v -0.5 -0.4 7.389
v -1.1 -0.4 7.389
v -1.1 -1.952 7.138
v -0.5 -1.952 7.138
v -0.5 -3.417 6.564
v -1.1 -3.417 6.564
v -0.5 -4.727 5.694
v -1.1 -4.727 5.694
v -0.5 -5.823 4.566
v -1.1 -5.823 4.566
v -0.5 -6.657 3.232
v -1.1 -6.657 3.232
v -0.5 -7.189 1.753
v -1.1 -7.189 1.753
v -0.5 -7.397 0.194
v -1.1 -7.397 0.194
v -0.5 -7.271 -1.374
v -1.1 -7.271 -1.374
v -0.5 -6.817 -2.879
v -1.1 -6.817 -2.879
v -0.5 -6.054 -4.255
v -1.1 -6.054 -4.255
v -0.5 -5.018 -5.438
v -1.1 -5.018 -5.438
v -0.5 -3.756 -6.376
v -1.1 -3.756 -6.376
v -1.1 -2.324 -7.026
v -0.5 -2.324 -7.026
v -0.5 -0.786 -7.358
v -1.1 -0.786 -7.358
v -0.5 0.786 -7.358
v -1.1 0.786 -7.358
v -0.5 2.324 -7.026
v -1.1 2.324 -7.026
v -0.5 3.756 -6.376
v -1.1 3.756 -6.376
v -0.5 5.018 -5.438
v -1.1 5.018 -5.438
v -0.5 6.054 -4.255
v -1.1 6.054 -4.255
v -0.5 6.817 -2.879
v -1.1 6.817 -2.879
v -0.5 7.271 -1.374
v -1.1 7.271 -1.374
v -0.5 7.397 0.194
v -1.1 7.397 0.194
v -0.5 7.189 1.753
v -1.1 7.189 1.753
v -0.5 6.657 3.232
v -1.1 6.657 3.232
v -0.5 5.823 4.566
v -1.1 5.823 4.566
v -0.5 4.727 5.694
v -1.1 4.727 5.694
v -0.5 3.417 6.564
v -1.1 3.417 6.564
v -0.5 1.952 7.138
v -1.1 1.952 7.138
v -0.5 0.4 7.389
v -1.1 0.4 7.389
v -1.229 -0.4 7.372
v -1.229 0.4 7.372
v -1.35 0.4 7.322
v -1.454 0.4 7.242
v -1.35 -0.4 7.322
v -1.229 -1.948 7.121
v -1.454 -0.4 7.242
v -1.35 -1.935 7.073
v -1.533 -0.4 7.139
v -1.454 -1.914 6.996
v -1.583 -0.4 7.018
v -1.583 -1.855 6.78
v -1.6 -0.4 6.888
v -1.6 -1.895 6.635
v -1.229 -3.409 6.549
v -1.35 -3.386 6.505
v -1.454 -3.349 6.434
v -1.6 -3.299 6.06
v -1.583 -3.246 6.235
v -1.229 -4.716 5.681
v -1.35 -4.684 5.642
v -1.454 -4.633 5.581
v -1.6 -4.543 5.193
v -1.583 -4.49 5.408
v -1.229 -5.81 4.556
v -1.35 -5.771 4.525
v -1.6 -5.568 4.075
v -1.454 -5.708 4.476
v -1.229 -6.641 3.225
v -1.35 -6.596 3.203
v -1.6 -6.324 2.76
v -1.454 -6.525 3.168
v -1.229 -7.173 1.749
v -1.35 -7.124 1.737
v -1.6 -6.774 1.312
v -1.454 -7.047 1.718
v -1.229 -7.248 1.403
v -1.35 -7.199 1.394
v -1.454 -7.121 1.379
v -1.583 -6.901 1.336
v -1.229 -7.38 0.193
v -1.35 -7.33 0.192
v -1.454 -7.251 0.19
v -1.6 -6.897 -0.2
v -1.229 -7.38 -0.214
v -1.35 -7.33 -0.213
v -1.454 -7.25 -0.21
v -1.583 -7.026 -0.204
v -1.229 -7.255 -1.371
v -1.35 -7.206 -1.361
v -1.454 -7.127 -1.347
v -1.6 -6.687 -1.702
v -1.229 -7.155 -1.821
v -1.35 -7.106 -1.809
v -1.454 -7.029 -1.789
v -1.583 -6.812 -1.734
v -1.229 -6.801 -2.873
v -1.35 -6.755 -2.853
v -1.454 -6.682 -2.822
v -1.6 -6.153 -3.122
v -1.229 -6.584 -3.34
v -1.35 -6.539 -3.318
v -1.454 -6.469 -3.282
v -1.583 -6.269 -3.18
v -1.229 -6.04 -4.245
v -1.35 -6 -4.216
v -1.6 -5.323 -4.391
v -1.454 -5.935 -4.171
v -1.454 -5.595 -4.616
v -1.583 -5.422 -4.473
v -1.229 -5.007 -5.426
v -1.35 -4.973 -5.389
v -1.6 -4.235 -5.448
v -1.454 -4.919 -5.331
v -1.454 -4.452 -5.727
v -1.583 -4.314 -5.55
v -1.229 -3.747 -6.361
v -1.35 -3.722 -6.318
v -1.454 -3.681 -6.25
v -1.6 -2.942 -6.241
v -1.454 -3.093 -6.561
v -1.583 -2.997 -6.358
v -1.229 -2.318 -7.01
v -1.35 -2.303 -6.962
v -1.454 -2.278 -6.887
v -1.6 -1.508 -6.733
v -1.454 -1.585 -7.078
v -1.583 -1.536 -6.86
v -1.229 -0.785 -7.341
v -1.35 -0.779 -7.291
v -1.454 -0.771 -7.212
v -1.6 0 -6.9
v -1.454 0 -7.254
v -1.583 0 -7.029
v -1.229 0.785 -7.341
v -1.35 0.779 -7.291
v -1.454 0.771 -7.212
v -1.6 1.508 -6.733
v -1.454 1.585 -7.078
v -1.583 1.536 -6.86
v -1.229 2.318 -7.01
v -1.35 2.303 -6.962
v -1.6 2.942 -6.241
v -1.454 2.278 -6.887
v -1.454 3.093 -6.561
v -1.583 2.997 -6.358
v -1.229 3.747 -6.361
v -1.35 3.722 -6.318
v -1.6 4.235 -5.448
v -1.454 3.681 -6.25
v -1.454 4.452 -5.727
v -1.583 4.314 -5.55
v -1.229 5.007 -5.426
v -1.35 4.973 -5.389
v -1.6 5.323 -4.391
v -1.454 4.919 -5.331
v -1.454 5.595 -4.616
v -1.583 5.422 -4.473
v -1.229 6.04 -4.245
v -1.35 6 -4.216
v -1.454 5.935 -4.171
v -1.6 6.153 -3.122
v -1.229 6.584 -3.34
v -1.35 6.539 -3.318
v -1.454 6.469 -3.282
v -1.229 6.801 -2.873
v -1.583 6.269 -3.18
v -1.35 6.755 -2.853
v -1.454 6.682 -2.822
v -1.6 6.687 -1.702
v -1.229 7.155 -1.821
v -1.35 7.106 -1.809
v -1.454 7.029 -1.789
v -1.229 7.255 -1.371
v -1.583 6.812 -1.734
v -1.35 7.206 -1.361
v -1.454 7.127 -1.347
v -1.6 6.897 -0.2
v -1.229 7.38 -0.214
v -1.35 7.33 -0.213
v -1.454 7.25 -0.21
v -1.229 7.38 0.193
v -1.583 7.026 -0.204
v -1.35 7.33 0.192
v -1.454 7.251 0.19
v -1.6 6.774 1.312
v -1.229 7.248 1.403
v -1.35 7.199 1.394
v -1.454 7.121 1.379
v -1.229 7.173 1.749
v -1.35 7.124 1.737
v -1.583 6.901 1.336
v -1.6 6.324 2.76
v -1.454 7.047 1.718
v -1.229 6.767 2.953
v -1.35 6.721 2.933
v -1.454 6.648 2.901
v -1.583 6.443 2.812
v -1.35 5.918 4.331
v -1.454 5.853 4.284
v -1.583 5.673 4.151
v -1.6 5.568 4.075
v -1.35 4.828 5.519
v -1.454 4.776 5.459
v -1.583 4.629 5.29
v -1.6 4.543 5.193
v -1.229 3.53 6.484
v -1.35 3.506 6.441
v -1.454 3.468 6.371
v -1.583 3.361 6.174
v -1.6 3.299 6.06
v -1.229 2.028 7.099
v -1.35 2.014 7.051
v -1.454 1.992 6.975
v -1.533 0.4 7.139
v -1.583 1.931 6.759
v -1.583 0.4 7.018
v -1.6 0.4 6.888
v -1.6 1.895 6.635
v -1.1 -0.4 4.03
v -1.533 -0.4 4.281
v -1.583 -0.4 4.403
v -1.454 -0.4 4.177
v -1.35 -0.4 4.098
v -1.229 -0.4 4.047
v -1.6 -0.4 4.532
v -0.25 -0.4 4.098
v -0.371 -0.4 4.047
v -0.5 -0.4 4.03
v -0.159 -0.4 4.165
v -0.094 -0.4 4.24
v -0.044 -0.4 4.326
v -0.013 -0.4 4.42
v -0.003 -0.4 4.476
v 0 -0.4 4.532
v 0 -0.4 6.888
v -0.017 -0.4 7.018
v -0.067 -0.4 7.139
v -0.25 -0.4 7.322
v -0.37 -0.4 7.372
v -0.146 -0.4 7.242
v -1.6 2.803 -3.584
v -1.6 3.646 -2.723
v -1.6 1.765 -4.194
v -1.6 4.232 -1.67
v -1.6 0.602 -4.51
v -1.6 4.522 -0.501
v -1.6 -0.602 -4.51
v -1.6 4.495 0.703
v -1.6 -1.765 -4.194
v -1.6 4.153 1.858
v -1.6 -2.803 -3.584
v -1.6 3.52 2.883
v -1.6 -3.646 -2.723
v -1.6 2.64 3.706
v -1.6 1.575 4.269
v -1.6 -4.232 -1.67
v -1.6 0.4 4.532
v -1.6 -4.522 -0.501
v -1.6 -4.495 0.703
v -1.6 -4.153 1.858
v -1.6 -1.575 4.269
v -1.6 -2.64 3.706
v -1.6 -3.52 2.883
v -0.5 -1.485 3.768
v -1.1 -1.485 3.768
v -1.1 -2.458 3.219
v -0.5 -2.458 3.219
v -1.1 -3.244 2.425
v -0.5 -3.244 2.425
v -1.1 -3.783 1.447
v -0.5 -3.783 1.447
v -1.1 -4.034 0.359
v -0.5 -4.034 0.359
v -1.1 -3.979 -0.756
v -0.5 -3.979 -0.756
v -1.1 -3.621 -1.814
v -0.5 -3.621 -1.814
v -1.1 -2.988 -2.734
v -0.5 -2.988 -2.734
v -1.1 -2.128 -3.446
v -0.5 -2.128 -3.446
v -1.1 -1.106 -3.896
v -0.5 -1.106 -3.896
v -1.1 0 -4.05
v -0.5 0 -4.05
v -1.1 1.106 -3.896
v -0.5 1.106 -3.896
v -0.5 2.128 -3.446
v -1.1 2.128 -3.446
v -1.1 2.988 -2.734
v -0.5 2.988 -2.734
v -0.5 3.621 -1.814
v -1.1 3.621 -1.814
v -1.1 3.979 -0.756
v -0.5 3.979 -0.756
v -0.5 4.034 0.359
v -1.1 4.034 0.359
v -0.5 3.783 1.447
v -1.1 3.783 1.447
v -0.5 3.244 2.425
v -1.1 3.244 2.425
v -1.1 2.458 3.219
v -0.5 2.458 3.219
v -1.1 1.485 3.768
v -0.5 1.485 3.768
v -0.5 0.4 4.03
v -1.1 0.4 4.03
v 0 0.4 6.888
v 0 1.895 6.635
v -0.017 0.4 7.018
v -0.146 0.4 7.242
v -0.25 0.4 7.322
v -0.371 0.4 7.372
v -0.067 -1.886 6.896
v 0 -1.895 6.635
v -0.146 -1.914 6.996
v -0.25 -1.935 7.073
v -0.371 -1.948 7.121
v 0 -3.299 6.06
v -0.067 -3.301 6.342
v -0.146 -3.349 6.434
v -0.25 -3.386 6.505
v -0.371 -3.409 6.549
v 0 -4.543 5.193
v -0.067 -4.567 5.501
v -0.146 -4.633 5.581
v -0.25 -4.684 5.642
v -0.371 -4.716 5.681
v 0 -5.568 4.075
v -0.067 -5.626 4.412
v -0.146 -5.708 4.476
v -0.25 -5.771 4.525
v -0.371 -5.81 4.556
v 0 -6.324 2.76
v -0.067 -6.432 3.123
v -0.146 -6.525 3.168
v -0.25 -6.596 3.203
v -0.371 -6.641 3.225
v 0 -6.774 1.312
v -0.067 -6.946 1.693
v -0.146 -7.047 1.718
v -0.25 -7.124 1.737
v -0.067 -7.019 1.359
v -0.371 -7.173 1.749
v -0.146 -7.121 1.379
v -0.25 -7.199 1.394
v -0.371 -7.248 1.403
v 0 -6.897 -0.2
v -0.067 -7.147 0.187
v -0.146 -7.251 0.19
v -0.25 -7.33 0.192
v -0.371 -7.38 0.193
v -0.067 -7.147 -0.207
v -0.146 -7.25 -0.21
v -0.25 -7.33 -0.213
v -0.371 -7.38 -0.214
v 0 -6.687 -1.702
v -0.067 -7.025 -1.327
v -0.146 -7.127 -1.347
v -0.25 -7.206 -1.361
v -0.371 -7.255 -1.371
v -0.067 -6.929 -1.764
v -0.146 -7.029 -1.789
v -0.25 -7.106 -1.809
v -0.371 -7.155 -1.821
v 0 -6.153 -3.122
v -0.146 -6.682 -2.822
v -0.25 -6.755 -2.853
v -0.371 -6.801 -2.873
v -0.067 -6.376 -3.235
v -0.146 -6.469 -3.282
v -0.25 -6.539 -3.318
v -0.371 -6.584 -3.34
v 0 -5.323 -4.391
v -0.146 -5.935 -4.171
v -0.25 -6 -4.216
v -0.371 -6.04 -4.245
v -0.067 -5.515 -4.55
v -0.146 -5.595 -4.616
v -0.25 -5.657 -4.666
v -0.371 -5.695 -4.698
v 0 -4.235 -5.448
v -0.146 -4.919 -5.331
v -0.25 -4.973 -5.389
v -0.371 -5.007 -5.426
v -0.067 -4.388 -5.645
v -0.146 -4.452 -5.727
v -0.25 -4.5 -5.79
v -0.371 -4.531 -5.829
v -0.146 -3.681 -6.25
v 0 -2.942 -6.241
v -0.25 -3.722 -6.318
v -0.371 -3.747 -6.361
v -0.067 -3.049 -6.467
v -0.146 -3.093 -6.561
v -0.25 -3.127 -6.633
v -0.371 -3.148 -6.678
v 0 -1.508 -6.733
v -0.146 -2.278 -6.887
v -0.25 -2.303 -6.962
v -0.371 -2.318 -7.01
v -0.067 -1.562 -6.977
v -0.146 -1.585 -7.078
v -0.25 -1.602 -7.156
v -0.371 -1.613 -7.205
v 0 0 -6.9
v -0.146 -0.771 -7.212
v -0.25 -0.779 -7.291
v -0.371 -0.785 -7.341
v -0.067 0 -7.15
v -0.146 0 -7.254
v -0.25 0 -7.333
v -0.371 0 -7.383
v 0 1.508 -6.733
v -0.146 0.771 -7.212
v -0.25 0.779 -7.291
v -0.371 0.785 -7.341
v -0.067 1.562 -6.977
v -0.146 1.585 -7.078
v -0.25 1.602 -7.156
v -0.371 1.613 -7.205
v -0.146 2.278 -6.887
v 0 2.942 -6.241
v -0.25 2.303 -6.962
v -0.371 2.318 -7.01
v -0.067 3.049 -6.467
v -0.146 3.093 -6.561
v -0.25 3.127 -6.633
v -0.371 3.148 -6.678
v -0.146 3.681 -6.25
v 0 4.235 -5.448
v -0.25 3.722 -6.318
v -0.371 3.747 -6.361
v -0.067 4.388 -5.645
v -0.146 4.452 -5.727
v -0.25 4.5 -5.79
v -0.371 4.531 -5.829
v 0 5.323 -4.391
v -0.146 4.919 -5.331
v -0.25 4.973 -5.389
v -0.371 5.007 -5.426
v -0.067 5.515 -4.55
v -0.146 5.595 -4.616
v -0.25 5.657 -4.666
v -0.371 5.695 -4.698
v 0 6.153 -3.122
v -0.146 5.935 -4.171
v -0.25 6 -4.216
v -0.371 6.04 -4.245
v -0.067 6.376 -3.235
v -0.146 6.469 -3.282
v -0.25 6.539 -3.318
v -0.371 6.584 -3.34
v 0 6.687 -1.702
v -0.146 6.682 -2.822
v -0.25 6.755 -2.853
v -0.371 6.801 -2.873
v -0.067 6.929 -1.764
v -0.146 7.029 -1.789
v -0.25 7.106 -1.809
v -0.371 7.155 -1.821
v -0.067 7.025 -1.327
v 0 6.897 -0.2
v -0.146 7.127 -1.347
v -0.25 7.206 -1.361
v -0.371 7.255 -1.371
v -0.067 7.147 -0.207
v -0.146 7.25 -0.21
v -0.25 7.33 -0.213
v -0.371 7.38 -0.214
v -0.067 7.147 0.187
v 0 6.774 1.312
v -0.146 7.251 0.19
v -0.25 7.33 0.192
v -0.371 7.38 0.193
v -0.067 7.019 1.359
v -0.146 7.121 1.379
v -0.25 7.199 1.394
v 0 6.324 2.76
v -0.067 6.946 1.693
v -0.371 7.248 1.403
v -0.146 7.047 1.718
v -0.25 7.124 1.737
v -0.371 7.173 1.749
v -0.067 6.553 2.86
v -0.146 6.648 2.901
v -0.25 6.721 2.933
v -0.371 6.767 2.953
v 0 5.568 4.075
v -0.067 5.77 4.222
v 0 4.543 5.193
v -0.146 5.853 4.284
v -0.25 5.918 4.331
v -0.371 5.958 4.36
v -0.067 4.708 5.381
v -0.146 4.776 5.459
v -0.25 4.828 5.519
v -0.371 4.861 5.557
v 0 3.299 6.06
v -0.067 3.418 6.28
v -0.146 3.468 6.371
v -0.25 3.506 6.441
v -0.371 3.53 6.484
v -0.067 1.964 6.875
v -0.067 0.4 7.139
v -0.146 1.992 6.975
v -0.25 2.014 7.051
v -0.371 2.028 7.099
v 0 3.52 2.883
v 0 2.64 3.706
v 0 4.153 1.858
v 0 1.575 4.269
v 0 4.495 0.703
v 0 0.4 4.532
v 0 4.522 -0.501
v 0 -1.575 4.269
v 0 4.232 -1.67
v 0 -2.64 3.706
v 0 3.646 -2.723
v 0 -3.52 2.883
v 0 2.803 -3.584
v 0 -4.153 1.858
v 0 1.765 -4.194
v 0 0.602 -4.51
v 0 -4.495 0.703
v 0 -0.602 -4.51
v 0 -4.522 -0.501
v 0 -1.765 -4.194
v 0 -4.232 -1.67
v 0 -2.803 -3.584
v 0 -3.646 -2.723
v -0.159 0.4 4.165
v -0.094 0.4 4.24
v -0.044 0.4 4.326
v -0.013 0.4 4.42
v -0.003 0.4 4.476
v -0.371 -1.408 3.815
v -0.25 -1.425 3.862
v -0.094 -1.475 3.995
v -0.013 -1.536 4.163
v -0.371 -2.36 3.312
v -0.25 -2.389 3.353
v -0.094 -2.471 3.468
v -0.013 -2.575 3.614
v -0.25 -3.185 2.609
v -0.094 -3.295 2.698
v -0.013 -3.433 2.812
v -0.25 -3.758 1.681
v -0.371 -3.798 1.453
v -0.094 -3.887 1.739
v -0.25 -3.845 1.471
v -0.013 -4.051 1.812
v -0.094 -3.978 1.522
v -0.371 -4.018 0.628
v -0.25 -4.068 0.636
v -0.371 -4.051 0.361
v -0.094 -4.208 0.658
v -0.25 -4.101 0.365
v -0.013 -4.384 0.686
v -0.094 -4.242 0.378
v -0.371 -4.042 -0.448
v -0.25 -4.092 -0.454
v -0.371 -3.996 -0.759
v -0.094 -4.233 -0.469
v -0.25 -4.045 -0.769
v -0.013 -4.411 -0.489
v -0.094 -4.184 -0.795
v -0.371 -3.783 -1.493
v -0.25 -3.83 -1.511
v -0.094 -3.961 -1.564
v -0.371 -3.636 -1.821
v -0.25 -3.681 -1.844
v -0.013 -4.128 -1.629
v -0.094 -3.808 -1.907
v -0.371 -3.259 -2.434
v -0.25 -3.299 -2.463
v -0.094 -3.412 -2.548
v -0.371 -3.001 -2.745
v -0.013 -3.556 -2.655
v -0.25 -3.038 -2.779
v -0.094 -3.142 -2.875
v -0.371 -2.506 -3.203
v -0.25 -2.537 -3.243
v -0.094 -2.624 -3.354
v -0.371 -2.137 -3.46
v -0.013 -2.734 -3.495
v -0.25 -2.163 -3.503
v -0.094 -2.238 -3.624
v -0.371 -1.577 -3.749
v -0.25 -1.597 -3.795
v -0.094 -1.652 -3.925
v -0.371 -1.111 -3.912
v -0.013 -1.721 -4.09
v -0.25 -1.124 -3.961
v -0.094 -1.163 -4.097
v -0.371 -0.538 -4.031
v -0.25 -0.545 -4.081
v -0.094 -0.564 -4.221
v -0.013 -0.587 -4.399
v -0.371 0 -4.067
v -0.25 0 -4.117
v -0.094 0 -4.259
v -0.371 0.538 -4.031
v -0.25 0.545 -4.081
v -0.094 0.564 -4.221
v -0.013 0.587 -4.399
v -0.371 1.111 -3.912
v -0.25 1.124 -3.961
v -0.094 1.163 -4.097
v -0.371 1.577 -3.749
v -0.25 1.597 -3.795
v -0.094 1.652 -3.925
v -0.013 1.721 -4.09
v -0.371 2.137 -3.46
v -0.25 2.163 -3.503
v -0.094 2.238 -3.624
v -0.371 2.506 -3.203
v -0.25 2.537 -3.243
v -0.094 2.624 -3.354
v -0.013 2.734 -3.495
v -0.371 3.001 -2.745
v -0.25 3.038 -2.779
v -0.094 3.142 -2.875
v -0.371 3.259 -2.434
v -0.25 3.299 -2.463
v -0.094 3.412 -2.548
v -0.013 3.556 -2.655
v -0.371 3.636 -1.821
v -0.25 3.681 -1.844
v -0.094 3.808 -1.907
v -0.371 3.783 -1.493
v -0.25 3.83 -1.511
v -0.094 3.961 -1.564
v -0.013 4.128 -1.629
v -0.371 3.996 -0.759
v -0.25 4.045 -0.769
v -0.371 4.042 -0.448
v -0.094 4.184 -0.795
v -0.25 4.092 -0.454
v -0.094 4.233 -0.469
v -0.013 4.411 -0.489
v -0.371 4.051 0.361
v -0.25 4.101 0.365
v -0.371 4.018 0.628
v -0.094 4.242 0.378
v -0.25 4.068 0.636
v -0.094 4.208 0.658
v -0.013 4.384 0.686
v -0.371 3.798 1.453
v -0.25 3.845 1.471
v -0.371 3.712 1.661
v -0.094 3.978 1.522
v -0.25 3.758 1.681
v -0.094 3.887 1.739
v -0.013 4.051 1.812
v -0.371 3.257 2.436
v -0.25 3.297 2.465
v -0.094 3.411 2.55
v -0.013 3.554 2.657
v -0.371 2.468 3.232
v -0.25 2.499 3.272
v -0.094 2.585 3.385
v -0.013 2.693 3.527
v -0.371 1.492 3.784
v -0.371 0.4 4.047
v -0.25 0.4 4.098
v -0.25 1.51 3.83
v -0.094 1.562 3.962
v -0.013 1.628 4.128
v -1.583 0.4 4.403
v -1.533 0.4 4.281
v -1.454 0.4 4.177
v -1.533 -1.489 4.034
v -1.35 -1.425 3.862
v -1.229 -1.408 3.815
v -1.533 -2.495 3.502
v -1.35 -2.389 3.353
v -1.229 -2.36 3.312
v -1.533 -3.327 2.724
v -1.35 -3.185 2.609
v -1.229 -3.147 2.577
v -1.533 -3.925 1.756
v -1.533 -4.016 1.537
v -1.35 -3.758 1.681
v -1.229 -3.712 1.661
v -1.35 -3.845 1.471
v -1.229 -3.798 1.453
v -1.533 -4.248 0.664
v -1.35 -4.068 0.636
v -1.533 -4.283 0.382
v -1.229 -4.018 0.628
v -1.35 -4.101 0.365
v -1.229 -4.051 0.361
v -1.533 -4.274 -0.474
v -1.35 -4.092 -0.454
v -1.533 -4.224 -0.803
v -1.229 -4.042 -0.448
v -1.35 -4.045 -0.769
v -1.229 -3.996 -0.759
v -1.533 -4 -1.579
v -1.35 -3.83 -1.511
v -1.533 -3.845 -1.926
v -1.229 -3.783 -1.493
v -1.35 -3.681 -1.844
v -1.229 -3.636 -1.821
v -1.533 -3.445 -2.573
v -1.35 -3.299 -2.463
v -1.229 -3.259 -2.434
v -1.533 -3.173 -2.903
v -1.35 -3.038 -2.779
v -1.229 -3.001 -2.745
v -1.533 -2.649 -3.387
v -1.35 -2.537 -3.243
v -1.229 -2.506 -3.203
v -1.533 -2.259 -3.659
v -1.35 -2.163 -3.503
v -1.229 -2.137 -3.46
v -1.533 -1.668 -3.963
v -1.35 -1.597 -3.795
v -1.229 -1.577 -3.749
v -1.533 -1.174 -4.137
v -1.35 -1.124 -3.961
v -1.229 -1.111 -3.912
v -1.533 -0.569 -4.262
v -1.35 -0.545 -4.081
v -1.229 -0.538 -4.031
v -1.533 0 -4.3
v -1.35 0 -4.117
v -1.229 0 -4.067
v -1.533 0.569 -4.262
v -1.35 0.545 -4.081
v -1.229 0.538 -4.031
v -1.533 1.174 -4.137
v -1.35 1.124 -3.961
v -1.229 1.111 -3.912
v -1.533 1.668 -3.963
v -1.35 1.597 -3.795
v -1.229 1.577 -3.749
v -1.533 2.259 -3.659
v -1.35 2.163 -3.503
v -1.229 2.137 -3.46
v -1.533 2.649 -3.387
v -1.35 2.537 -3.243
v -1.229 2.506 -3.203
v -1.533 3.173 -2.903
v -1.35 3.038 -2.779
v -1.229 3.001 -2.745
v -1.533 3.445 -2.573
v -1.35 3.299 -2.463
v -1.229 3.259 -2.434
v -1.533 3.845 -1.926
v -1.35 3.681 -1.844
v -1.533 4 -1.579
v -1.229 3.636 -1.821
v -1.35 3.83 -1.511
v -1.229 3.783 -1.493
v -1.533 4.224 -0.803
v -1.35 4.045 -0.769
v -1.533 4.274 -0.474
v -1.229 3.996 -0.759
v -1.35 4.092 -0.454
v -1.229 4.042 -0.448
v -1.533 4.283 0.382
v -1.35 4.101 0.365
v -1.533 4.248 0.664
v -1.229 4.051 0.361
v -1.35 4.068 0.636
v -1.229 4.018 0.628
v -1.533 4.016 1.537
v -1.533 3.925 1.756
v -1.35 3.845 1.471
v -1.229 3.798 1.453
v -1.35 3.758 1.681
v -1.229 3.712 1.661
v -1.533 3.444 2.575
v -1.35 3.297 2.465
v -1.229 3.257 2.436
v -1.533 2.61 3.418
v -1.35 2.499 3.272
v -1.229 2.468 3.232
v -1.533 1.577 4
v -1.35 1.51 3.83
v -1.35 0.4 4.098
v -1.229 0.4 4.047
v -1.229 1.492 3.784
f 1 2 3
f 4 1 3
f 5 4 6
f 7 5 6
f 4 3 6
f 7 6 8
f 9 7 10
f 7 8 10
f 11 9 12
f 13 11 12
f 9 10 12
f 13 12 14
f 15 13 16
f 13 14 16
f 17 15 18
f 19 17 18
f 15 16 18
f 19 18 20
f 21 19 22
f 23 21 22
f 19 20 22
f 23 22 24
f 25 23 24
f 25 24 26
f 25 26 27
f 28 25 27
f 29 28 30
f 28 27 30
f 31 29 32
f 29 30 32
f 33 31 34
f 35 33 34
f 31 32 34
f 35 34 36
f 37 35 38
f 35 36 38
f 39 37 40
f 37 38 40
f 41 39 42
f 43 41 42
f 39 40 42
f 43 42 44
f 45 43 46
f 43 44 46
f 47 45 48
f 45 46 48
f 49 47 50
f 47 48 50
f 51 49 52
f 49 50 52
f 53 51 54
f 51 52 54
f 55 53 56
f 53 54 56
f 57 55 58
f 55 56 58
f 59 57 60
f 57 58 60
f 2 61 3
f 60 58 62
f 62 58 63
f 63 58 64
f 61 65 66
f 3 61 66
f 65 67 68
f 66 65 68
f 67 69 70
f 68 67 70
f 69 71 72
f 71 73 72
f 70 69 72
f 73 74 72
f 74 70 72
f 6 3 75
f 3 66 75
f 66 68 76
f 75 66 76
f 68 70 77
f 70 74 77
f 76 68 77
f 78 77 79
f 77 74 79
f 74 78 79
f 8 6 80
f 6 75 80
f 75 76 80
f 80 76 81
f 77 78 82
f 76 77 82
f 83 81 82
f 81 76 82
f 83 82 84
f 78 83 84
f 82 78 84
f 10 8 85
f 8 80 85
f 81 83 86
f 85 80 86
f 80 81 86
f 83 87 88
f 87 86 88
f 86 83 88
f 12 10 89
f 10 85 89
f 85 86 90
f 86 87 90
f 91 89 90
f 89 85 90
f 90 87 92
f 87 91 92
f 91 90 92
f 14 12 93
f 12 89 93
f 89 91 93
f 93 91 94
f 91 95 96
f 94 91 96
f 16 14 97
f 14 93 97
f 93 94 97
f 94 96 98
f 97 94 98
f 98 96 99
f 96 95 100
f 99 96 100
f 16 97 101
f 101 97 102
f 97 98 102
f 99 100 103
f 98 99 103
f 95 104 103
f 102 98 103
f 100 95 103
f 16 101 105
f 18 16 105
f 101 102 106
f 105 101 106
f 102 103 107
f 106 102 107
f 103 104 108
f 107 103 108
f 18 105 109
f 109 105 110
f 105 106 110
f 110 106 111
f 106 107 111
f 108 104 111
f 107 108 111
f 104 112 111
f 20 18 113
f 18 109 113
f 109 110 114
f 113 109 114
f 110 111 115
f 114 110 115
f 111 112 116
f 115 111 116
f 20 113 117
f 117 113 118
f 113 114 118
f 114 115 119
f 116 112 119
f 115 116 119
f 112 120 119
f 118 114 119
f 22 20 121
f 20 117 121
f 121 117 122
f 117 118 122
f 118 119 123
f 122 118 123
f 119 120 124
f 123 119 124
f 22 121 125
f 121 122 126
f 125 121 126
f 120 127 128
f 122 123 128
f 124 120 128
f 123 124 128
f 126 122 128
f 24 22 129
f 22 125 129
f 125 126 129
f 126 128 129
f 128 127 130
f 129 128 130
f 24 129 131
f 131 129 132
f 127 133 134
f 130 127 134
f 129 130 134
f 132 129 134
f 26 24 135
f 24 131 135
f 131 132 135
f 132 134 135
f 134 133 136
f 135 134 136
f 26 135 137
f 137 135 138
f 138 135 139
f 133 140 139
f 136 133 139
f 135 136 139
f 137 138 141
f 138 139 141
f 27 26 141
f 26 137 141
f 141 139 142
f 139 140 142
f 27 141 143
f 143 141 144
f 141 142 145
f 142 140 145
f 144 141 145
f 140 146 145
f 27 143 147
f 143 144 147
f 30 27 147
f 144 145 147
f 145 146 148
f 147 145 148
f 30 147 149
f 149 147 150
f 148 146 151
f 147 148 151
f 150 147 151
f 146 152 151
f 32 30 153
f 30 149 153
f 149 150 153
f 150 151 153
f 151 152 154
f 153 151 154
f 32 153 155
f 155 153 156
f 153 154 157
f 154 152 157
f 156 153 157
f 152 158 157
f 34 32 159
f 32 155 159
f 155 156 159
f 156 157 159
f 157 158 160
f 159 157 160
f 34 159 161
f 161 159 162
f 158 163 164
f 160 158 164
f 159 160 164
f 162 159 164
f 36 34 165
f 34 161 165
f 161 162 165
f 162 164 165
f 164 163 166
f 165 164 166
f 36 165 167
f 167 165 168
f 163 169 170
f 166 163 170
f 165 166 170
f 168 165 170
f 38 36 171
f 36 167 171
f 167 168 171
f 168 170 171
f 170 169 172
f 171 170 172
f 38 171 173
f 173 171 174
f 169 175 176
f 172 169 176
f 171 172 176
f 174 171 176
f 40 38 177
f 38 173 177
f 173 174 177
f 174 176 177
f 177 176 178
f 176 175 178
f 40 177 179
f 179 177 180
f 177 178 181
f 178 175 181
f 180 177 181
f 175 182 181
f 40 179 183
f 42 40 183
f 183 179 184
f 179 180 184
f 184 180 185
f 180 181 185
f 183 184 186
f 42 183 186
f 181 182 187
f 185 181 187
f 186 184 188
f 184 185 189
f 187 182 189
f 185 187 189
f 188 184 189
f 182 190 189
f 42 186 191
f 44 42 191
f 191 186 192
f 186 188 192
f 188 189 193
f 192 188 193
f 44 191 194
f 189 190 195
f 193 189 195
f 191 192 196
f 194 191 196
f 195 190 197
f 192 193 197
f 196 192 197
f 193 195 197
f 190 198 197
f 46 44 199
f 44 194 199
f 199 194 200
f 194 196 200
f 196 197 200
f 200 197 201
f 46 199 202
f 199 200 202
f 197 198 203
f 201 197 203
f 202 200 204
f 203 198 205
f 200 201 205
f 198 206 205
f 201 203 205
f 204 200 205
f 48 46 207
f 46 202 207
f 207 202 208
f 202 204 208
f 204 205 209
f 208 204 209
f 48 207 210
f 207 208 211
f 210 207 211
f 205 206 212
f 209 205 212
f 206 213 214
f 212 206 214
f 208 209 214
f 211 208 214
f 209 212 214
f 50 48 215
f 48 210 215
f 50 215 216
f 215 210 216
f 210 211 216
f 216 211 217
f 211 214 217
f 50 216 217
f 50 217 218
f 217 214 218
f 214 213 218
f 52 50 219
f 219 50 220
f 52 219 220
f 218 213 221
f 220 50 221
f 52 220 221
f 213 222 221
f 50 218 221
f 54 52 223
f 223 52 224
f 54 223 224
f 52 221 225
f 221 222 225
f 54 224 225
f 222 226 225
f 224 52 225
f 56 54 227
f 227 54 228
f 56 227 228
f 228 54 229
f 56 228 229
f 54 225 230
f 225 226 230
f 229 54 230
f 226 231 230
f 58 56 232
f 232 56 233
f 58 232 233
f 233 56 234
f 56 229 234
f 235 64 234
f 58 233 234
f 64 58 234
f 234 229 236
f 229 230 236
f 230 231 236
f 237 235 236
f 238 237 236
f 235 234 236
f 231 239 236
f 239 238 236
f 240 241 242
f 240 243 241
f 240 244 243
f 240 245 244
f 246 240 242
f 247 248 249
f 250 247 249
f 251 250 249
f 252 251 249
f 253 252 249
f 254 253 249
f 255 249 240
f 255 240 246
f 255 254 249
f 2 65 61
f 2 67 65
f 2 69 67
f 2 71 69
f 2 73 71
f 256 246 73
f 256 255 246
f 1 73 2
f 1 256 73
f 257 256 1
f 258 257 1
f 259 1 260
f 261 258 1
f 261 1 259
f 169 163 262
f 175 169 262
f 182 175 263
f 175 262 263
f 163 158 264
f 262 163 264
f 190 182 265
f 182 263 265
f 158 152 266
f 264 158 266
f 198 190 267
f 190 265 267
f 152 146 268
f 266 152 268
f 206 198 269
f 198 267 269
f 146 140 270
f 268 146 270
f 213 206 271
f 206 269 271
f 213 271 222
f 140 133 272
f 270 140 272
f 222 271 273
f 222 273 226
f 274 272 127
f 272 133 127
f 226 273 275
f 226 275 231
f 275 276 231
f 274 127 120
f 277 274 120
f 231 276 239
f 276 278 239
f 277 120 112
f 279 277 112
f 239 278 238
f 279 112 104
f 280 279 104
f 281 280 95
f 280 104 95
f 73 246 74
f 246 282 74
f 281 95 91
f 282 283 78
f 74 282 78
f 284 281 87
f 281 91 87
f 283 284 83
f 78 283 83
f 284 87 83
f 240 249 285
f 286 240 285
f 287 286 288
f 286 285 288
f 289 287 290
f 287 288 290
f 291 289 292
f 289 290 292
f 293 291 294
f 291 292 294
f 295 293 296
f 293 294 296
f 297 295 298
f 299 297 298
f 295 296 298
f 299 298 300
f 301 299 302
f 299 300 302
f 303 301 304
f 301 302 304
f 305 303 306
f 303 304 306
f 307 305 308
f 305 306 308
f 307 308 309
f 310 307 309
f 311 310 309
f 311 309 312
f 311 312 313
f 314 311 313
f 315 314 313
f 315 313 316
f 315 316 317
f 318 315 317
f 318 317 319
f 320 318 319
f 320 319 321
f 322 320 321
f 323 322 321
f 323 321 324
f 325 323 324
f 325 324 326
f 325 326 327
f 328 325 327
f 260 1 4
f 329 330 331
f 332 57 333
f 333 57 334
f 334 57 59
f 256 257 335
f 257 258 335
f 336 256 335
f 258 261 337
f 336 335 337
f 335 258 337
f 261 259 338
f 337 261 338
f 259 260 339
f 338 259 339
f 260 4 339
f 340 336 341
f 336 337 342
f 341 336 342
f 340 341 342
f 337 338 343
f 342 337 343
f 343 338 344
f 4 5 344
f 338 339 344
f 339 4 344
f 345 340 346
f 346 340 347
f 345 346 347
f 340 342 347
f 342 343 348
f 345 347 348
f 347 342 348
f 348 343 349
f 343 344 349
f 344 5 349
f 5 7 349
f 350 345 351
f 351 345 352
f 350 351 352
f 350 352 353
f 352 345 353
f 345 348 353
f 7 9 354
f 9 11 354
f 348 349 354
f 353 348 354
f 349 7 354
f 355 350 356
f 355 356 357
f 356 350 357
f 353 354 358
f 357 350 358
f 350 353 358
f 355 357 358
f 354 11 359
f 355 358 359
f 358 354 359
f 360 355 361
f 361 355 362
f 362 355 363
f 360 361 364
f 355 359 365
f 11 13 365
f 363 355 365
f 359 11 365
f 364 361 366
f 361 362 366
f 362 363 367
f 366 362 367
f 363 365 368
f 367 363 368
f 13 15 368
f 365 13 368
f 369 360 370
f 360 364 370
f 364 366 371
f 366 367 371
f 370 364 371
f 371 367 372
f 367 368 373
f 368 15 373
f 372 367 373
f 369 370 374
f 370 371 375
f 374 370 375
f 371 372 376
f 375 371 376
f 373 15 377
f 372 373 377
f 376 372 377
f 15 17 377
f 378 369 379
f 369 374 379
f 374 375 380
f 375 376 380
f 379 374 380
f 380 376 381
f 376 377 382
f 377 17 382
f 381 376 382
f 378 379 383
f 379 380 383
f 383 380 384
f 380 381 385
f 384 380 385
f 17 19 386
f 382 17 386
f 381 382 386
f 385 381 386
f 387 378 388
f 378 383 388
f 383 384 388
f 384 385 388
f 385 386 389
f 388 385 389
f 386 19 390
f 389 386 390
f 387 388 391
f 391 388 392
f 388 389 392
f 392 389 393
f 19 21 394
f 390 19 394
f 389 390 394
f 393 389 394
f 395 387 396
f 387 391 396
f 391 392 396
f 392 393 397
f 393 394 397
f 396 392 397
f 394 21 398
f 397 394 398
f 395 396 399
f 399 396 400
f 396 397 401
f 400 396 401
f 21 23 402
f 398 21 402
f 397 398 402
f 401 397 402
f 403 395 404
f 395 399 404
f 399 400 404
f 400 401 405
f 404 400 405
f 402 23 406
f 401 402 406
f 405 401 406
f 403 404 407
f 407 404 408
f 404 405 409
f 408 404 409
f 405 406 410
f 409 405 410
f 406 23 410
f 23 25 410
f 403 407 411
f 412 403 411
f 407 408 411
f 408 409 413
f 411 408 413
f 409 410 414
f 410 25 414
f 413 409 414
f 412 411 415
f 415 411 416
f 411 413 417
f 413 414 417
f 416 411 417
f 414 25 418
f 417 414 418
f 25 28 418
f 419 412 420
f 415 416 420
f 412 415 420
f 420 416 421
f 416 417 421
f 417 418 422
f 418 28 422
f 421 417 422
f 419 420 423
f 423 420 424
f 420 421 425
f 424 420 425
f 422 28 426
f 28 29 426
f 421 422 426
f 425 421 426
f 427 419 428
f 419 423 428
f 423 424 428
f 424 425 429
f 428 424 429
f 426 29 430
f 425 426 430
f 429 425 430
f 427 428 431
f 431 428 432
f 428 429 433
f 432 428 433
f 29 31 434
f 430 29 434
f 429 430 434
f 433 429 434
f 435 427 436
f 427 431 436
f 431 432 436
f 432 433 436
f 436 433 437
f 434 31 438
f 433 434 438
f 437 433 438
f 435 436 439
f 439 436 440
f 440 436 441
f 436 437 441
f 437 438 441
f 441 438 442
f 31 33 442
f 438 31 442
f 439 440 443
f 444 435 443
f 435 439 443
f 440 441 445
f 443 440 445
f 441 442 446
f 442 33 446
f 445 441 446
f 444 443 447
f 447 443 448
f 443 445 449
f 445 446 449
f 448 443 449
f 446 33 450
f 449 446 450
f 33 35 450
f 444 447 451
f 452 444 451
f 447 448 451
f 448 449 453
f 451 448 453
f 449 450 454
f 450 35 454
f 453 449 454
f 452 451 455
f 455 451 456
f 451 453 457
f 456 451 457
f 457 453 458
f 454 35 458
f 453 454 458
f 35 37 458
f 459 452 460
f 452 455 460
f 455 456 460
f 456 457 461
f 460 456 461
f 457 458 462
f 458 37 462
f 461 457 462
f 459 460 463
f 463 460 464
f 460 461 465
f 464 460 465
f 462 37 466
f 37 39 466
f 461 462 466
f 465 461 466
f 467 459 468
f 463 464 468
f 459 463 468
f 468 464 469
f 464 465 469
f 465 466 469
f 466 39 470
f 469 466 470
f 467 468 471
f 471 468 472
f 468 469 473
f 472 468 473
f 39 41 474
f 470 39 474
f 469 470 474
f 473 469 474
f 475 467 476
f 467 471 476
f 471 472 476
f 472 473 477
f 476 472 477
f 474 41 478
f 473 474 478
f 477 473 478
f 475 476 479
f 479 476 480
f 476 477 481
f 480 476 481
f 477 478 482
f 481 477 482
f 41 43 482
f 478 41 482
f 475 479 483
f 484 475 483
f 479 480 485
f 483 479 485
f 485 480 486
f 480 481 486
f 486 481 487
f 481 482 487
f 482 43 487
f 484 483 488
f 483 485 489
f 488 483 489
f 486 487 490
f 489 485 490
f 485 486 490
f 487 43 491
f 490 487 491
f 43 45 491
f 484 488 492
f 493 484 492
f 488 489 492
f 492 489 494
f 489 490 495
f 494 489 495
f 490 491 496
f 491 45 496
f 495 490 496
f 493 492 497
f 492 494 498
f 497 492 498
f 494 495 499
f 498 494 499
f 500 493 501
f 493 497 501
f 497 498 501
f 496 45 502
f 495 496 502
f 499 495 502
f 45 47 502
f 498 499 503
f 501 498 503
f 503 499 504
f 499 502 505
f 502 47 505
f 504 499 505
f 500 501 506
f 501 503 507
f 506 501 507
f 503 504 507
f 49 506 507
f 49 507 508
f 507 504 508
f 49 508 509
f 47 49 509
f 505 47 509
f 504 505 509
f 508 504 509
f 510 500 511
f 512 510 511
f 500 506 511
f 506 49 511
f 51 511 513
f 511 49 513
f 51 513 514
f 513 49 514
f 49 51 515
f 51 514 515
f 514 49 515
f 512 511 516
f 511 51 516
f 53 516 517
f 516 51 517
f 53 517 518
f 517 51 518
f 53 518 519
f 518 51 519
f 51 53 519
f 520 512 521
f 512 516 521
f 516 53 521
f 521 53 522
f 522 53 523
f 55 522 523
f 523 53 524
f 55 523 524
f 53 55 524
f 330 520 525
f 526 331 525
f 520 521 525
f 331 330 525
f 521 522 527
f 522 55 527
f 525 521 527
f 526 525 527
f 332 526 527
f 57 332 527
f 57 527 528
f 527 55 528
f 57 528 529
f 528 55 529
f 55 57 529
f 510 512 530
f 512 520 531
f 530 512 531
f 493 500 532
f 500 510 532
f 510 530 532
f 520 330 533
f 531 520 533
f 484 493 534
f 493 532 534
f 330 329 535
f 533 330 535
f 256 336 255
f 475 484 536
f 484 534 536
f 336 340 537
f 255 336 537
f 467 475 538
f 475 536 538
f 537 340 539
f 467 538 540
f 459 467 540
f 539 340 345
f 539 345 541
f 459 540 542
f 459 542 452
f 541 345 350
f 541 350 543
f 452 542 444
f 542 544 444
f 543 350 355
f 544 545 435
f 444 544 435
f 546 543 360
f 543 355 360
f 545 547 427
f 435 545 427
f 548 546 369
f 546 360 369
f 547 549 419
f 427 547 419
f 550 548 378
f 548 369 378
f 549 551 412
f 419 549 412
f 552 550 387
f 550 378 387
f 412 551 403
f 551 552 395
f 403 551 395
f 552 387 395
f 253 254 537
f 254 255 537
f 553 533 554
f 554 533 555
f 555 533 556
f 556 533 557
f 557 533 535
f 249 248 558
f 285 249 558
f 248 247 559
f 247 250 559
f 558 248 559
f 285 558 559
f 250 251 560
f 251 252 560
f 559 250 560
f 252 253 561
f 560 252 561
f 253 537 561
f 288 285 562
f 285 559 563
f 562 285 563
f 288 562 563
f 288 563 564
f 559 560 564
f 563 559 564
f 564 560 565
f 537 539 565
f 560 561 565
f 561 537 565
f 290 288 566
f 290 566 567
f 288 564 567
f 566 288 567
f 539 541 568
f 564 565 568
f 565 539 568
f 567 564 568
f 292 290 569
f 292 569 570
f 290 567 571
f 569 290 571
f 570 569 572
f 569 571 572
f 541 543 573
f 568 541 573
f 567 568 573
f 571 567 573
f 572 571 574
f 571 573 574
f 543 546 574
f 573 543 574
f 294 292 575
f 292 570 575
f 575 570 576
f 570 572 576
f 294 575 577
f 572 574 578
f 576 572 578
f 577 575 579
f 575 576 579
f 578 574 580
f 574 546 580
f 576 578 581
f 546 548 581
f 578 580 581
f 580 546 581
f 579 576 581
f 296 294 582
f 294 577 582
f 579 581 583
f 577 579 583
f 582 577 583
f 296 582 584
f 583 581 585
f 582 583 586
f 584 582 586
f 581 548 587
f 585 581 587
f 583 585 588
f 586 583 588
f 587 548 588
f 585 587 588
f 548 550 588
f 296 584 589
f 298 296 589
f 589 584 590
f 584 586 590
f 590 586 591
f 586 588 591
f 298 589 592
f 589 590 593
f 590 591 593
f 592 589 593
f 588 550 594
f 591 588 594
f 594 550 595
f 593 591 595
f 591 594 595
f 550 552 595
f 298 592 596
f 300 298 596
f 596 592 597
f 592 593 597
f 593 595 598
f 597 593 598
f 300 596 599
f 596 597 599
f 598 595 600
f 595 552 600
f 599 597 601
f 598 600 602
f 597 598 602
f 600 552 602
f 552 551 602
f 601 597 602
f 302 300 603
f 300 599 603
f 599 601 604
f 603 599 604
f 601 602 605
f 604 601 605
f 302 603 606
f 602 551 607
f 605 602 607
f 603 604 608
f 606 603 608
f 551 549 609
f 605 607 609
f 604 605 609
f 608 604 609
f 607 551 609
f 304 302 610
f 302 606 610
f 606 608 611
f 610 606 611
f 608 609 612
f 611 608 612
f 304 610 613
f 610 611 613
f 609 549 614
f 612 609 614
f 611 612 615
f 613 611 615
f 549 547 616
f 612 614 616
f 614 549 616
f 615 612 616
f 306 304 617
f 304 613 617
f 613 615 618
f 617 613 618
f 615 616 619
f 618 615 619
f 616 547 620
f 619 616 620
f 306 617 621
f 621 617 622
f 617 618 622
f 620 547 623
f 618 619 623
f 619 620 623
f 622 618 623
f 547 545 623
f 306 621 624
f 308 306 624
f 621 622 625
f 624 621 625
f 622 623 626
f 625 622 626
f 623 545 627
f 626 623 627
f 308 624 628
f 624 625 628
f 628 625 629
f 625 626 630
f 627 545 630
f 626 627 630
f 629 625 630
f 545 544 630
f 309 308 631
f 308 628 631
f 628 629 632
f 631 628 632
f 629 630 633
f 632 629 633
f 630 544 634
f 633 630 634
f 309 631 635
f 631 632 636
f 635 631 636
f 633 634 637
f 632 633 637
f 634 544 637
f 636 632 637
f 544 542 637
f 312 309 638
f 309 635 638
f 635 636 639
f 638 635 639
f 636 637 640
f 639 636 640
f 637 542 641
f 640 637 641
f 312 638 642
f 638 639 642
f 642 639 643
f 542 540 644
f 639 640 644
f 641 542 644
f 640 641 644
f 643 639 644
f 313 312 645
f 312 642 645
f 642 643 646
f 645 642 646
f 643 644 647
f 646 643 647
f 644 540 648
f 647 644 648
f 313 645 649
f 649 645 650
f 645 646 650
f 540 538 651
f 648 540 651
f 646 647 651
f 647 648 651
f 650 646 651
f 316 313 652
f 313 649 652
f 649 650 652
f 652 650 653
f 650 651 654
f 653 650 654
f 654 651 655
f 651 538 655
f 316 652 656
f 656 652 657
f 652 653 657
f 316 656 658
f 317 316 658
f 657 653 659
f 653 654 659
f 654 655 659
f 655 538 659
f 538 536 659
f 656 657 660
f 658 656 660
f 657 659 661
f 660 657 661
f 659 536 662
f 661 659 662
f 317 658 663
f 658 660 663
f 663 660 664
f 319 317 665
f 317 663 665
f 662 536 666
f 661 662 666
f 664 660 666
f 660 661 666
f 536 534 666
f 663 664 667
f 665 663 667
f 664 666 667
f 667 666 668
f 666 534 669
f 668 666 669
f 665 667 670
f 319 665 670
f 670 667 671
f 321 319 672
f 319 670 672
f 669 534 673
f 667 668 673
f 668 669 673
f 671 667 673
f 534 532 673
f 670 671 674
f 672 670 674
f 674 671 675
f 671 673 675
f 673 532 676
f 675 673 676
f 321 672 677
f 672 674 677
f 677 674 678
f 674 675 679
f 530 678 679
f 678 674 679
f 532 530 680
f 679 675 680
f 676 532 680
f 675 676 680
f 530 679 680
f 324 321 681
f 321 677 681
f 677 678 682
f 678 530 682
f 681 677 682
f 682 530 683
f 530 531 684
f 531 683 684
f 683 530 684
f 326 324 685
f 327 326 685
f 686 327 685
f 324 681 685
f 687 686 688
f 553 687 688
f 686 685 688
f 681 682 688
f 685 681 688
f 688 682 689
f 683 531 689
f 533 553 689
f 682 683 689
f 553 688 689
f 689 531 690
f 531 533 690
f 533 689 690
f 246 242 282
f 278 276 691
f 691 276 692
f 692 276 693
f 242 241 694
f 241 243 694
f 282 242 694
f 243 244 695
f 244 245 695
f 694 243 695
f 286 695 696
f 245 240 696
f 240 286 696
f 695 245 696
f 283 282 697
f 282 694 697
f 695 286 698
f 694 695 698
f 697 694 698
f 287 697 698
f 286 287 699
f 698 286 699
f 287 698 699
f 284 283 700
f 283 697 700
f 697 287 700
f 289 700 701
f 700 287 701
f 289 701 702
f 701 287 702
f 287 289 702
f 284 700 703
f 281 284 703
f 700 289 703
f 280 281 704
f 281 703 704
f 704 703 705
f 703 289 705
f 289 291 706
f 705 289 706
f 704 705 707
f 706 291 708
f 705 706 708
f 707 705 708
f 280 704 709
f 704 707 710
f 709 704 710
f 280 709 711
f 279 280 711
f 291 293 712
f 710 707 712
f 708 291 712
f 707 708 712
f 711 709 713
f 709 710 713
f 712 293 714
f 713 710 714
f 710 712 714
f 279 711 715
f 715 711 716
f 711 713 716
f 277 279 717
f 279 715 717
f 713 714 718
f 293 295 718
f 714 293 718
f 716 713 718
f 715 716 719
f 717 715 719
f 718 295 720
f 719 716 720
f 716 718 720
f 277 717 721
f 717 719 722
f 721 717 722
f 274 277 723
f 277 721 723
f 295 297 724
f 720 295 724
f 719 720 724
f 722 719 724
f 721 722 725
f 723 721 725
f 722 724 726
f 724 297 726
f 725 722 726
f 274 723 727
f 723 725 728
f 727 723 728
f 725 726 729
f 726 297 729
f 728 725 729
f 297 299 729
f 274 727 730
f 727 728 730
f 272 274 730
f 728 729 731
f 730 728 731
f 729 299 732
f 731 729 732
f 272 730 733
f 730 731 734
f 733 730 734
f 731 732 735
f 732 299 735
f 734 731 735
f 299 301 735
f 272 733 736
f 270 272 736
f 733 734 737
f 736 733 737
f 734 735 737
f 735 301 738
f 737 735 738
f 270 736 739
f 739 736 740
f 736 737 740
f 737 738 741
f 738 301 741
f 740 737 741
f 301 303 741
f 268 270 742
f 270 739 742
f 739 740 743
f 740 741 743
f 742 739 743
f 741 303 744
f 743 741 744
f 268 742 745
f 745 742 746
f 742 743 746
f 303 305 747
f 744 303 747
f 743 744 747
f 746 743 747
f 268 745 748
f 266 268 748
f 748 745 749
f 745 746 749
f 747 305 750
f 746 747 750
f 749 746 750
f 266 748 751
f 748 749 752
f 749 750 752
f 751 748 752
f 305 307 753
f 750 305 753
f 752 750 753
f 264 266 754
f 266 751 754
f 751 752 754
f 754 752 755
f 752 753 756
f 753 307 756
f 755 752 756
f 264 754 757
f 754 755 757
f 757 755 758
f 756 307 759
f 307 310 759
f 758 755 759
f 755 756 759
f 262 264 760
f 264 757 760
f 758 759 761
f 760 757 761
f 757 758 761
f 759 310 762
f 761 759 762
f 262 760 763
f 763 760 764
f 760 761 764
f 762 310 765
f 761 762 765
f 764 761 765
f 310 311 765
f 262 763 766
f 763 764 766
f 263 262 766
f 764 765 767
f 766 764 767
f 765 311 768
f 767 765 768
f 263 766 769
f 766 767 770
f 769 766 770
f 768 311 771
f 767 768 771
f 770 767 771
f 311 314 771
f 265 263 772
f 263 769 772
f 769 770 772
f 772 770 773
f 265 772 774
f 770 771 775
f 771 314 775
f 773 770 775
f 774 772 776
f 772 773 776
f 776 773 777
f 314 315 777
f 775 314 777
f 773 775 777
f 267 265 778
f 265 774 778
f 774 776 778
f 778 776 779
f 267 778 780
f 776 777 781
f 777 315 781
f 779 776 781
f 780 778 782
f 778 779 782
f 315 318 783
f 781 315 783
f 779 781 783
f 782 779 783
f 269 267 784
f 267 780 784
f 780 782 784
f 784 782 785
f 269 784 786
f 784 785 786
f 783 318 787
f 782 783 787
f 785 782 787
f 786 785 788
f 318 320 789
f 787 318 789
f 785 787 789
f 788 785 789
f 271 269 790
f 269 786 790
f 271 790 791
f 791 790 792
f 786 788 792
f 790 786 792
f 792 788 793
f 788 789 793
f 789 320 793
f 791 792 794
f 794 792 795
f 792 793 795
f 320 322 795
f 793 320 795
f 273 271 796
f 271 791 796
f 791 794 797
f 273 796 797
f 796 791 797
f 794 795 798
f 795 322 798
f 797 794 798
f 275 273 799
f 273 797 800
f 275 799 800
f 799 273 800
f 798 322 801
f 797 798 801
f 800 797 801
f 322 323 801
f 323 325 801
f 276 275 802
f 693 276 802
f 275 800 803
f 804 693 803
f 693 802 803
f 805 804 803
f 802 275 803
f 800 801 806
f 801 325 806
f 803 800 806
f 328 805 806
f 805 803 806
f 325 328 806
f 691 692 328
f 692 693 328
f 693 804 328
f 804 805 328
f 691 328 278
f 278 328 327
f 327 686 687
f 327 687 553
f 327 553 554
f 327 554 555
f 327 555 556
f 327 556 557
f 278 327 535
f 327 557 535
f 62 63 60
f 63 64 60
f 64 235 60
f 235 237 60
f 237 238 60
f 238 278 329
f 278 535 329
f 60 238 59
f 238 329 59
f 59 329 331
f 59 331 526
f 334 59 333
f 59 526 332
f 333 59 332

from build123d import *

# Parameters (mm, degrees)
SKETCH2_W = 0.8
SKETCH2_H = 7.548
GAP_DEPTH = 11.586784214
CONG_1_R  = 0.5


with BuildPart() as part:
    # Sketch1 → Base-Revolve (revolve)
    with BuildSketch(Plane.XY, mode=Mode.PRIVATE) as base_revolve_sk:
        with BuildLine():
            Line((0, 4.55), (0, 7.4))
            Line((0, 7.4), (-1.6, 7.4))
            Line((-1.6, 7.4), (-1.6, 4.55))
            ThreePointArc((-1.6, 4.55), (-1.453553391, 4.196446609), (-1.1, 4.05))
            Line((-1.1, 4.05), (-0.5, 4.05))
            ThreePointArc((-0.5, 4.05), (-0.146446609, 4.196446609), (0, 4.55))
        make_face()
    revolve(base_revolve_sk.sketch.rotate(Axis((-34.925, 0, 0), (1, 0, 0)), 90), axis=Axis((-34.925, 0, 0), (1, 0, 0)))

    # Sketch2 → Gap (cut, through all)
    with BuildSketch(Plane(origin=(0, 0, 0), x_dir=(0, -1, 0), z_dir=(-1, 0, 0))):
        with Locations((0, 3.774)):
            Rectangle(SKETCH2_W, SKETCH2_H)
    extrude(amount=GAP_DEPTH, mode=Mode.SUBTRACT)

    # Congé1
    cong_1_edges = [part.edges().sort_by_distance(p)[0] for p in [
        (-1.6, 0, -7.4),
        (0, 0, -7.4),
    ]]
    fillet(cong_1_edges, radius=CONG_1_R)


solid = part.part
